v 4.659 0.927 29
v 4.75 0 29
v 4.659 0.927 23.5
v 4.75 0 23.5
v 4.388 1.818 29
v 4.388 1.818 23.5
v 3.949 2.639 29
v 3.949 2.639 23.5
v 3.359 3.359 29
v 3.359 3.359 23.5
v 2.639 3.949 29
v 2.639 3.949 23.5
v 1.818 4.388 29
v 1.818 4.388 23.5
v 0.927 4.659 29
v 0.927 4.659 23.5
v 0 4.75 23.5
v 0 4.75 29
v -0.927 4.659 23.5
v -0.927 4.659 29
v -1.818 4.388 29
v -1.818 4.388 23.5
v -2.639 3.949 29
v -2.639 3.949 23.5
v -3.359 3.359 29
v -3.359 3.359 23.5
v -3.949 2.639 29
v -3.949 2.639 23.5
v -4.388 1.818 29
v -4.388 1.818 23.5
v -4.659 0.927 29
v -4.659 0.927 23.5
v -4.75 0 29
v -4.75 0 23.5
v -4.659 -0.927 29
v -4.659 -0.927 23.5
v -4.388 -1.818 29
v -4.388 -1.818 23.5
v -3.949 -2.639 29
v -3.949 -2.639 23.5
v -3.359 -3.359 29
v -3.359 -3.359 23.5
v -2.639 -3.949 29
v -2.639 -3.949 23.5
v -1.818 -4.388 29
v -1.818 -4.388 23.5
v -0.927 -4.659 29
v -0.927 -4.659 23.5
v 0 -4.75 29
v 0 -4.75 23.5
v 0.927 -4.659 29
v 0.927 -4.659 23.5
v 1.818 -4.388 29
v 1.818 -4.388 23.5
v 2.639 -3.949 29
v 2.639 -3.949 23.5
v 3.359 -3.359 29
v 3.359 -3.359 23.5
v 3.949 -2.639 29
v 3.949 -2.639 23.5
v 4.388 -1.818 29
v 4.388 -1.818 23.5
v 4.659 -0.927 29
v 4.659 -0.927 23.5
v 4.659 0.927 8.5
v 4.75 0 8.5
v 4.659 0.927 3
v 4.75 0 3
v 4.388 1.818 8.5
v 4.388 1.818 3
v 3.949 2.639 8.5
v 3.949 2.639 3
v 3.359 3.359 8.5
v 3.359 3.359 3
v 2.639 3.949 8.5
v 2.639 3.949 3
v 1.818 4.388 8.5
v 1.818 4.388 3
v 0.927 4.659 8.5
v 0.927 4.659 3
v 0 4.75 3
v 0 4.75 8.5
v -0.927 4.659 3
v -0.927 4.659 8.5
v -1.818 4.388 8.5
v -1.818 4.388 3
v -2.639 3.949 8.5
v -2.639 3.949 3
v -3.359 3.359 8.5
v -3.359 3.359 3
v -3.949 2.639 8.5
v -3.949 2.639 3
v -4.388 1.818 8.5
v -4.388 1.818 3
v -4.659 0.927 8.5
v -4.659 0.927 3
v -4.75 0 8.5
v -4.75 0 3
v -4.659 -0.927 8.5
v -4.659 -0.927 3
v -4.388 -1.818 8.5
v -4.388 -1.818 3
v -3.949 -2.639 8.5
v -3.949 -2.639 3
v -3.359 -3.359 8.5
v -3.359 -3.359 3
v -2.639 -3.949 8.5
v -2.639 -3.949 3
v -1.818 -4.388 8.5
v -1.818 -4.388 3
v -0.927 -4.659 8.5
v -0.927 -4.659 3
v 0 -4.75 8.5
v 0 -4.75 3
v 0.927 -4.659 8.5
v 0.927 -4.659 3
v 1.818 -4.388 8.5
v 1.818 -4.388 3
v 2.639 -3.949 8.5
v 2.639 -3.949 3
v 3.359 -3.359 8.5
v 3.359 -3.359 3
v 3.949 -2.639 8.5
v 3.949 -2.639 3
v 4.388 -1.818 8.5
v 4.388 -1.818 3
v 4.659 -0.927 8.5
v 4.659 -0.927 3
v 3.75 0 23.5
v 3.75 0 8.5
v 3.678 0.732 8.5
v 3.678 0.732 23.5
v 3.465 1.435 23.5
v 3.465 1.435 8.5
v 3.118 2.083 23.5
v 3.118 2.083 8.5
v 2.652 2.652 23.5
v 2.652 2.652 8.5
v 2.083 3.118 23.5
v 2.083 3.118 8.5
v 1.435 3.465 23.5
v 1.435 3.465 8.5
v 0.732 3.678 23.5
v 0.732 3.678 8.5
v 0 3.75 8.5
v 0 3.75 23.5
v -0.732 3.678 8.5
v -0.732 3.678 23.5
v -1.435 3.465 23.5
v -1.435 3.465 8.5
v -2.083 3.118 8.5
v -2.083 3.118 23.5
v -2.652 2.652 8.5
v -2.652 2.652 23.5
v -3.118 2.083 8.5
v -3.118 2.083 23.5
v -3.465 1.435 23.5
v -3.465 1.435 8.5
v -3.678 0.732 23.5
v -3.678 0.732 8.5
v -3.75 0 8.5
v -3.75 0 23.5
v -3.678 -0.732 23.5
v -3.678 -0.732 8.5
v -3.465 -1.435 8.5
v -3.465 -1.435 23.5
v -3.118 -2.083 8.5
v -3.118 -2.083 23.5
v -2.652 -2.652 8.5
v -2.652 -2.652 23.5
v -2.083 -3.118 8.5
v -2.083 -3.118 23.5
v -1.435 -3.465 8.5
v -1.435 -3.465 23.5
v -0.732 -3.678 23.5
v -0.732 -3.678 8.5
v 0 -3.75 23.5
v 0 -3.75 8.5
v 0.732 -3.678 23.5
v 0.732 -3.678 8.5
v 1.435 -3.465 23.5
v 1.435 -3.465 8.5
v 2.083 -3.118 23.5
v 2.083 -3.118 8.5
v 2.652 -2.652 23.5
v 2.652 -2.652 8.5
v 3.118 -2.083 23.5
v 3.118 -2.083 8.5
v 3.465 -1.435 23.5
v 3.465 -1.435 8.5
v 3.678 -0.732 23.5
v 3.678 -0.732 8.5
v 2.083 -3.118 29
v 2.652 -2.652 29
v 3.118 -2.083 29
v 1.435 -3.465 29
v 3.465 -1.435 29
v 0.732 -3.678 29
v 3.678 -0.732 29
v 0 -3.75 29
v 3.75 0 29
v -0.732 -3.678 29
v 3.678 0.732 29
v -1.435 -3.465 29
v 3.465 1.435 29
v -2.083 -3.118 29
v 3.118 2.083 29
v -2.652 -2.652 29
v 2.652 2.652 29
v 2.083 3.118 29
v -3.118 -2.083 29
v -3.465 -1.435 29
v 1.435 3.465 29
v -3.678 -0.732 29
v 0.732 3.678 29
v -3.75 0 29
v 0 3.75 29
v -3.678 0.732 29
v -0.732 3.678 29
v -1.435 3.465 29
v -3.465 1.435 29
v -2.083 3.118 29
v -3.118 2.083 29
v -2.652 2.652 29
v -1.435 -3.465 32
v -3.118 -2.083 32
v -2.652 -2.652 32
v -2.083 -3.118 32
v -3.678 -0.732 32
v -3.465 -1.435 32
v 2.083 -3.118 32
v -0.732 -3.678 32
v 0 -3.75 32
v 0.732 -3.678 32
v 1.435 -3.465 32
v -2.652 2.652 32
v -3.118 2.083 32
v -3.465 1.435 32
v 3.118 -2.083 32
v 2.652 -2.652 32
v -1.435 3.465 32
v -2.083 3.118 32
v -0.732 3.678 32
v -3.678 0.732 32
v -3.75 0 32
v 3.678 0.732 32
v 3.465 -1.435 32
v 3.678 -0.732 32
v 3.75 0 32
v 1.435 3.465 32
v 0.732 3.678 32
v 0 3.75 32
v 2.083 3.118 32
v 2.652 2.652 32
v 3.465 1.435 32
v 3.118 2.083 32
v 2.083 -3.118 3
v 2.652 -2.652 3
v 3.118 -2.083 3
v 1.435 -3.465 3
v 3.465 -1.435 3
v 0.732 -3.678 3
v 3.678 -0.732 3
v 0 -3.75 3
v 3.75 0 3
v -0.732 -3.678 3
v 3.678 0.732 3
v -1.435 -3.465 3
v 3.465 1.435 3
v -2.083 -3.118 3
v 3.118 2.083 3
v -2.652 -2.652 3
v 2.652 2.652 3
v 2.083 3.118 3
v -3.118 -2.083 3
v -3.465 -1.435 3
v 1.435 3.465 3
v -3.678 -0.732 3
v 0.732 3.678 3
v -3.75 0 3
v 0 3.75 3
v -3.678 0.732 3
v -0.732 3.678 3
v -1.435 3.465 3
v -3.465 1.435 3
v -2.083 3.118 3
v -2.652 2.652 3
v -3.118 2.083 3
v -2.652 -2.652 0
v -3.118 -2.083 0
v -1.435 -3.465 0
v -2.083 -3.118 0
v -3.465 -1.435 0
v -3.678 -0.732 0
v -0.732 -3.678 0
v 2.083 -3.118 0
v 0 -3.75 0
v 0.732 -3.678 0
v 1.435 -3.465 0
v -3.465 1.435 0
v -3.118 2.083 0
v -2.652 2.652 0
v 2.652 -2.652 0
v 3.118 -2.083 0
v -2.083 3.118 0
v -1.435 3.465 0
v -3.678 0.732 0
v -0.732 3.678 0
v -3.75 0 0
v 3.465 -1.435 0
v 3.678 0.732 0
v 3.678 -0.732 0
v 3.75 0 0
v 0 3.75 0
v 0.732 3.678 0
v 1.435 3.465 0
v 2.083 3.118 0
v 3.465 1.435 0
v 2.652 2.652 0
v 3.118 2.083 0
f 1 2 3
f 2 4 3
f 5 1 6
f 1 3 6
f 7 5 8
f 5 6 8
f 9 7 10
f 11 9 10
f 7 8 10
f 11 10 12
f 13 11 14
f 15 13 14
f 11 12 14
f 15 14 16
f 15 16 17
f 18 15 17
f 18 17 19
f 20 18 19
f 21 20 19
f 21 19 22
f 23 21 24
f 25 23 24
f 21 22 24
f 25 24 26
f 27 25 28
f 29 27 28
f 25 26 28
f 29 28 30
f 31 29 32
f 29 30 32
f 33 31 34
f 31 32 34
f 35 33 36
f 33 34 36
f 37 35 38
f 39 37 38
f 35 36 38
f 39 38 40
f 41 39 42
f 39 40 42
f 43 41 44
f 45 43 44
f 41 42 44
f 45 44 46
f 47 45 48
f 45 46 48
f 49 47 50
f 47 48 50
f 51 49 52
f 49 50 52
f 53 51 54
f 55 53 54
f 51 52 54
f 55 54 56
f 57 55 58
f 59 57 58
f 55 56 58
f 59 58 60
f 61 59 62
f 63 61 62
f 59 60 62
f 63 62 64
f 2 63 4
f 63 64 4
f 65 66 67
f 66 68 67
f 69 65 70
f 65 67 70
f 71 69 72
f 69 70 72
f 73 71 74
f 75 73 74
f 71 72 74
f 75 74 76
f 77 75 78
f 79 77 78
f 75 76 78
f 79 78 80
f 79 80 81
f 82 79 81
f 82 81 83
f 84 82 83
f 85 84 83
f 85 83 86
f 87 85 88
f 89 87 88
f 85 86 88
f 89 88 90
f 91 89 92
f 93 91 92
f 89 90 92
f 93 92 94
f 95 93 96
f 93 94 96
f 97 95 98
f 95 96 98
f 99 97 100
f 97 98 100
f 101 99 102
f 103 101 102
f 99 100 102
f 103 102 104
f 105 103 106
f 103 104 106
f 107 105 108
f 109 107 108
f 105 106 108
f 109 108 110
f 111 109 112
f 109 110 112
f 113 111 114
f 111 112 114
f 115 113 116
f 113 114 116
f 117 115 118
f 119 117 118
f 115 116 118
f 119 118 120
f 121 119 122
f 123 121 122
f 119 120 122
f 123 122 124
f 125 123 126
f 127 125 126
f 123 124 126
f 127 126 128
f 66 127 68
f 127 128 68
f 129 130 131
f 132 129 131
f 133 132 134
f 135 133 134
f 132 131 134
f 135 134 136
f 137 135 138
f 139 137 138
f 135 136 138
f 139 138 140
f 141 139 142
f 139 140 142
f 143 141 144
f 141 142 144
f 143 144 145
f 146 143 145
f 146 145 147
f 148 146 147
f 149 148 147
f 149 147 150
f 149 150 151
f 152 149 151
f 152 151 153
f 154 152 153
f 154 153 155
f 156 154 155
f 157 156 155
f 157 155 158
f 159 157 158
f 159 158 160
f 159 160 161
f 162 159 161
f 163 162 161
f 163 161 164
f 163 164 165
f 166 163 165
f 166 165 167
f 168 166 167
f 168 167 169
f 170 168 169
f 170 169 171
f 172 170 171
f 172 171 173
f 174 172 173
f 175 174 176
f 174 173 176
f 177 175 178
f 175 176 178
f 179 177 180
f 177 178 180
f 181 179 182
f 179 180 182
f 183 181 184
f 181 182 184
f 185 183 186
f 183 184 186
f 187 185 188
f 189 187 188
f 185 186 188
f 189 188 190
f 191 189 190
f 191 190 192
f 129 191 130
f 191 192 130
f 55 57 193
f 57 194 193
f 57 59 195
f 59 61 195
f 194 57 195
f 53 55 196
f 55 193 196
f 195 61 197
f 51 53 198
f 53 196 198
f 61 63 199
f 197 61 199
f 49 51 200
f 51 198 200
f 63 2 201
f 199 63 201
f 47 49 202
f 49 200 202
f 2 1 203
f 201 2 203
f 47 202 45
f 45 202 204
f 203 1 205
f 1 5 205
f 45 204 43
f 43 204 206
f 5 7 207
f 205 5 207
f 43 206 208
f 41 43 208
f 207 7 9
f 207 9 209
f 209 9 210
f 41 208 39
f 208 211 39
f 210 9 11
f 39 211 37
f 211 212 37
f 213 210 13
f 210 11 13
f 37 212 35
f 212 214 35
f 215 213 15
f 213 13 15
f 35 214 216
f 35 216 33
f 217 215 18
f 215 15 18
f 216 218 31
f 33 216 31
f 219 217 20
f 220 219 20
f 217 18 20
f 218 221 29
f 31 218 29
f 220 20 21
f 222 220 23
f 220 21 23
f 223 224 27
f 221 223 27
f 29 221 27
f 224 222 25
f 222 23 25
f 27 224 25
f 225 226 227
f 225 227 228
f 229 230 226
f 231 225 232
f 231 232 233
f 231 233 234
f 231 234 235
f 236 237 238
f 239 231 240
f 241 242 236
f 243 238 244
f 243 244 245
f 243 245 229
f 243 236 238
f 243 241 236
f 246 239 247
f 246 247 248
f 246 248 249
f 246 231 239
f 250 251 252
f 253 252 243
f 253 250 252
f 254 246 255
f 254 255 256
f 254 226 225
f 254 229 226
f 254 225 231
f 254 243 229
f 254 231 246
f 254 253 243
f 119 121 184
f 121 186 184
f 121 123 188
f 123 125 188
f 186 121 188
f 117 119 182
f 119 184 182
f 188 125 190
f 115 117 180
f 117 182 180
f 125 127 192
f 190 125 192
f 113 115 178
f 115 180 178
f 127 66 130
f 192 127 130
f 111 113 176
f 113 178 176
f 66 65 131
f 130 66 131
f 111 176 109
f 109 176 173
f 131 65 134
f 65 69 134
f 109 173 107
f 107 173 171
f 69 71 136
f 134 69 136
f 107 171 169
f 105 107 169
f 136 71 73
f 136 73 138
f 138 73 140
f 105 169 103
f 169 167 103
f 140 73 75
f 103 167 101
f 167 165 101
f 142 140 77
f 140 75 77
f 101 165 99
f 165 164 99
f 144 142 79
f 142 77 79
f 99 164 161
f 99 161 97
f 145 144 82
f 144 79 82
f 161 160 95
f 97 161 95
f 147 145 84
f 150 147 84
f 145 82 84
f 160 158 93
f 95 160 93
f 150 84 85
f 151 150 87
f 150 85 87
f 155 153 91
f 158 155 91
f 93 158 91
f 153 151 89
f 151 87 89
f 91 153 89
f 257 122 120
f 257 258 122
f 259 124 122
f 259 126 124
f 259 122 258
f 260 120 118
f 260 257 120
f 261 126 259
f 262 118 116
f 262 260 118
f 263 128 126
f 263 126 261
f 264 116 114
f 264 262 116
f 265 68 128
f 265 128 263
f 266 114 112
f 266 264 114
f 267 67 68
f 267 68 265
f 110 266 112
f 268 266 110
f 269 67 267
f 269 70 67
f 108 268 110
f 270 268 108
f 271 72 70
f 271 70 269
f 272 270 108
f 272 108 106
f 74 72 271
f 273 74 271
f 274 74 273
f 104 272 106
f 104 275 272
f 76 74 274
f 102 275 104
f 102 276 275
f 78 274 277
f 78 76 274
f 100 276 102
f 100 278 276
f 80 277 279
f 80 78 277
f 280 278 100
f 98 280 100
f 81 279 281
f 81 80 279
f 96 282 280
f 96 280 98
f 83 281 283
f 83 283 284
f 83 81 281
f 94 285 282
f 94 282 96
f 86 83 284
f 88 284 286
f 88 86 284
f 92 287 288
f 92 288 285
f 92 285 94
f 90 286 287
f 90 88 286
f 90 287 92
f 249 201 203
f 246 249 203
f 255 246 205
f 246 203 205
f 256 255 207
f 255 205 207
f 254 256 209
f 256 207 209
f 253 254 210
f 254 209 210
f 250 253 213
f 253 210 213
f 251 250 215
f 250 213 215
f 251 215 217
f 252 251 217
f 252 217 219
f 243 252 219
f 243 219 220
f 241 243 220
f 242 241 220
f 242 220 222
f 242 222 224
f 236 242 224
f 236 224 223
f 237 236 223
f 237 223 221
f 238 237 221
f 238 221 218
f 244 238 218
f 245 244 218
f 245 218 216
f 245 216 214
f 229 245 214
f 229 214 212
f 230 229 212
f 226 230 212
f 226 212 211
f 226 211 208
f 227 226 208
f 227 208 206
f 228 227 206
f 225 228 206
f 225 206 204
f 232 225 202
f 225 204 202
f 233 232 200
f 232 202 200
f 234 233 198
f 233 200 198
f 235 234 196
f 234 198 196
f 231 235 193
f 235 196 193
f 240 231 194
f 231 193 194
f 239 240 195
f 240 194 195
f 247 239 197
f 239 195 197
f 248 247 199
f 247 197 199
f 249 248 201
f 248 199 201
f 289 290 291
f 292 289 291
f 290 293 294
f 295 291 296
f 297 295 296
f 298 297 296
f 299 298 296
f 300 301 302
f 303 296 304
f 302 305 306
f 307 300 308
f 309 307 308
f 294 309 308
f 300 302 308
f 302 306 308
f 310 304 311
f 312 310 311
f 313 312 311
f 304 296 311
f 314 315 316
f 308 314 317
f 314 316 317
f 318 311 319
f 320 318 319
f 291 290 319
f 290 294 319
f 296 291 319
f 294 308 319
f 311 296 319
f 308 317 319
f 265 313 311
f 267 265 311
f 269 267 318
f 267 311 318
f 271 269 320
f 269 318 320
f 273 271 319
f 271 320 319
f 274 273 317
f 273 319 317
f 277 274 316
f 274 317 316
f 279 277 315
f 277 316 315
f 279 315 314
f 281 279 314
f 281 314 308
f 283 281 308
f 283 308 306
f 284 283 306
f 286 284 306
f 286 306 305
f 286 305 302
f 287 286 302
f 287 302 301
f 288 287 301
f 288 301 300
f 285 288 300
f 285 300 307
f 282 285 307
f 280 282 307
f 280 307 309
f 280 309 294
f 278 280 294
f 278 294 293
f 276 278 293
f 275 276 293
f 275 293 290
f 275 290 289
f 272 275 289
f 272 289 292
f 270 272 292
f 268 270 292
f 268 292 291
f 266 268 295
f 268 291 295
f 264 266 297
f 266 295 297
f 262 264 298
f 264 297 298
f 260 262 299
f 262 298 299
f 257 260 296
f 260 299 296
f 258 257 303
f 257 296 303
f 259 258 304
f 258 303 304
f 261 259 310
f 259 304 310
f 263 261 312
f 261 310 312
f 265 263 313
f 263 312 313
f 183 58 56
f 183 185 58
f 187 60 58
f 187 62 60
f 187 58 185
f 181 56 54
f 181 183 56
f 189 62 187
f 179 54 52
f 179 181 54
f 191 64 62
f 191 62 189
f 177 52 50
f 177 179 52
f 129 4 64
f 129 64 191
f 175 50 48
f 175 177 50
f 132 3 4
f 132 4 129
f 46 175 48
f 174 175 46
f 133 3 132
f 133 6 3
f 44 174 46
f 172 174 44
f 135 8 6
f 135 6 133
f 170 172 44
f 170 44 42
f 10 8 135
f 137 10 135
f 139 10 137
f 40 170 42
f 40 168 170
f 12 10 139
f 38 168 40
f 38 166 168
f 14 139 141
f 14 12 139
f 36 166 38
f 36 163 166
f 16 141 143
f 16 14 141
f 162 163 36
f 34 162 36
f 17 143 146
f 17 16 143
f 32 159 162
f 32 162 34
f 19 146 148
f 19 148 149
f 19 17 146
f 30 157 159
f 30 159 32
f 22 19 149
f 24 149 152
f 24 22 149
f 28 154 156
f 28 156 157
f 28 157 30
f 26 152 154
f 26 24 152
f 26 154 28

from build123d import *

# Parameters (mm, degrees)
SKETCH1_R           = 3.75
BOSS_EXTRUDE1_DEPTH = 32
SKETCH2_W           = 1
SKETCH2_H           = 5.5


with BuildPart() as part:
    # Sketch1 → Boss-Extrude1 (new body)
    with BuildSketch(Plane.XY):
        Circle(SKETCH1_R)
    extrude(amount=BOSS_EXTRUDE1_DEPTH)

    # Sketch2 → Revolve1 (revolve)
    with BuildSketch(Plane(origin=(0, 0, 0), x_dir=(1, 0, 0), z_dir=(0, 1, 0))):
        with Locations((4.25, -26.25)):
            Rectangle(SKETCH2_W, SKETCH2_H)
        with Locations((4.25, -5.75)):
            Rectangle(SKETCH2_W, SKETCH2_H)
    revolve(axis=Axis((0, 0, 0), (0, 0, 1)))


solid = part.part
